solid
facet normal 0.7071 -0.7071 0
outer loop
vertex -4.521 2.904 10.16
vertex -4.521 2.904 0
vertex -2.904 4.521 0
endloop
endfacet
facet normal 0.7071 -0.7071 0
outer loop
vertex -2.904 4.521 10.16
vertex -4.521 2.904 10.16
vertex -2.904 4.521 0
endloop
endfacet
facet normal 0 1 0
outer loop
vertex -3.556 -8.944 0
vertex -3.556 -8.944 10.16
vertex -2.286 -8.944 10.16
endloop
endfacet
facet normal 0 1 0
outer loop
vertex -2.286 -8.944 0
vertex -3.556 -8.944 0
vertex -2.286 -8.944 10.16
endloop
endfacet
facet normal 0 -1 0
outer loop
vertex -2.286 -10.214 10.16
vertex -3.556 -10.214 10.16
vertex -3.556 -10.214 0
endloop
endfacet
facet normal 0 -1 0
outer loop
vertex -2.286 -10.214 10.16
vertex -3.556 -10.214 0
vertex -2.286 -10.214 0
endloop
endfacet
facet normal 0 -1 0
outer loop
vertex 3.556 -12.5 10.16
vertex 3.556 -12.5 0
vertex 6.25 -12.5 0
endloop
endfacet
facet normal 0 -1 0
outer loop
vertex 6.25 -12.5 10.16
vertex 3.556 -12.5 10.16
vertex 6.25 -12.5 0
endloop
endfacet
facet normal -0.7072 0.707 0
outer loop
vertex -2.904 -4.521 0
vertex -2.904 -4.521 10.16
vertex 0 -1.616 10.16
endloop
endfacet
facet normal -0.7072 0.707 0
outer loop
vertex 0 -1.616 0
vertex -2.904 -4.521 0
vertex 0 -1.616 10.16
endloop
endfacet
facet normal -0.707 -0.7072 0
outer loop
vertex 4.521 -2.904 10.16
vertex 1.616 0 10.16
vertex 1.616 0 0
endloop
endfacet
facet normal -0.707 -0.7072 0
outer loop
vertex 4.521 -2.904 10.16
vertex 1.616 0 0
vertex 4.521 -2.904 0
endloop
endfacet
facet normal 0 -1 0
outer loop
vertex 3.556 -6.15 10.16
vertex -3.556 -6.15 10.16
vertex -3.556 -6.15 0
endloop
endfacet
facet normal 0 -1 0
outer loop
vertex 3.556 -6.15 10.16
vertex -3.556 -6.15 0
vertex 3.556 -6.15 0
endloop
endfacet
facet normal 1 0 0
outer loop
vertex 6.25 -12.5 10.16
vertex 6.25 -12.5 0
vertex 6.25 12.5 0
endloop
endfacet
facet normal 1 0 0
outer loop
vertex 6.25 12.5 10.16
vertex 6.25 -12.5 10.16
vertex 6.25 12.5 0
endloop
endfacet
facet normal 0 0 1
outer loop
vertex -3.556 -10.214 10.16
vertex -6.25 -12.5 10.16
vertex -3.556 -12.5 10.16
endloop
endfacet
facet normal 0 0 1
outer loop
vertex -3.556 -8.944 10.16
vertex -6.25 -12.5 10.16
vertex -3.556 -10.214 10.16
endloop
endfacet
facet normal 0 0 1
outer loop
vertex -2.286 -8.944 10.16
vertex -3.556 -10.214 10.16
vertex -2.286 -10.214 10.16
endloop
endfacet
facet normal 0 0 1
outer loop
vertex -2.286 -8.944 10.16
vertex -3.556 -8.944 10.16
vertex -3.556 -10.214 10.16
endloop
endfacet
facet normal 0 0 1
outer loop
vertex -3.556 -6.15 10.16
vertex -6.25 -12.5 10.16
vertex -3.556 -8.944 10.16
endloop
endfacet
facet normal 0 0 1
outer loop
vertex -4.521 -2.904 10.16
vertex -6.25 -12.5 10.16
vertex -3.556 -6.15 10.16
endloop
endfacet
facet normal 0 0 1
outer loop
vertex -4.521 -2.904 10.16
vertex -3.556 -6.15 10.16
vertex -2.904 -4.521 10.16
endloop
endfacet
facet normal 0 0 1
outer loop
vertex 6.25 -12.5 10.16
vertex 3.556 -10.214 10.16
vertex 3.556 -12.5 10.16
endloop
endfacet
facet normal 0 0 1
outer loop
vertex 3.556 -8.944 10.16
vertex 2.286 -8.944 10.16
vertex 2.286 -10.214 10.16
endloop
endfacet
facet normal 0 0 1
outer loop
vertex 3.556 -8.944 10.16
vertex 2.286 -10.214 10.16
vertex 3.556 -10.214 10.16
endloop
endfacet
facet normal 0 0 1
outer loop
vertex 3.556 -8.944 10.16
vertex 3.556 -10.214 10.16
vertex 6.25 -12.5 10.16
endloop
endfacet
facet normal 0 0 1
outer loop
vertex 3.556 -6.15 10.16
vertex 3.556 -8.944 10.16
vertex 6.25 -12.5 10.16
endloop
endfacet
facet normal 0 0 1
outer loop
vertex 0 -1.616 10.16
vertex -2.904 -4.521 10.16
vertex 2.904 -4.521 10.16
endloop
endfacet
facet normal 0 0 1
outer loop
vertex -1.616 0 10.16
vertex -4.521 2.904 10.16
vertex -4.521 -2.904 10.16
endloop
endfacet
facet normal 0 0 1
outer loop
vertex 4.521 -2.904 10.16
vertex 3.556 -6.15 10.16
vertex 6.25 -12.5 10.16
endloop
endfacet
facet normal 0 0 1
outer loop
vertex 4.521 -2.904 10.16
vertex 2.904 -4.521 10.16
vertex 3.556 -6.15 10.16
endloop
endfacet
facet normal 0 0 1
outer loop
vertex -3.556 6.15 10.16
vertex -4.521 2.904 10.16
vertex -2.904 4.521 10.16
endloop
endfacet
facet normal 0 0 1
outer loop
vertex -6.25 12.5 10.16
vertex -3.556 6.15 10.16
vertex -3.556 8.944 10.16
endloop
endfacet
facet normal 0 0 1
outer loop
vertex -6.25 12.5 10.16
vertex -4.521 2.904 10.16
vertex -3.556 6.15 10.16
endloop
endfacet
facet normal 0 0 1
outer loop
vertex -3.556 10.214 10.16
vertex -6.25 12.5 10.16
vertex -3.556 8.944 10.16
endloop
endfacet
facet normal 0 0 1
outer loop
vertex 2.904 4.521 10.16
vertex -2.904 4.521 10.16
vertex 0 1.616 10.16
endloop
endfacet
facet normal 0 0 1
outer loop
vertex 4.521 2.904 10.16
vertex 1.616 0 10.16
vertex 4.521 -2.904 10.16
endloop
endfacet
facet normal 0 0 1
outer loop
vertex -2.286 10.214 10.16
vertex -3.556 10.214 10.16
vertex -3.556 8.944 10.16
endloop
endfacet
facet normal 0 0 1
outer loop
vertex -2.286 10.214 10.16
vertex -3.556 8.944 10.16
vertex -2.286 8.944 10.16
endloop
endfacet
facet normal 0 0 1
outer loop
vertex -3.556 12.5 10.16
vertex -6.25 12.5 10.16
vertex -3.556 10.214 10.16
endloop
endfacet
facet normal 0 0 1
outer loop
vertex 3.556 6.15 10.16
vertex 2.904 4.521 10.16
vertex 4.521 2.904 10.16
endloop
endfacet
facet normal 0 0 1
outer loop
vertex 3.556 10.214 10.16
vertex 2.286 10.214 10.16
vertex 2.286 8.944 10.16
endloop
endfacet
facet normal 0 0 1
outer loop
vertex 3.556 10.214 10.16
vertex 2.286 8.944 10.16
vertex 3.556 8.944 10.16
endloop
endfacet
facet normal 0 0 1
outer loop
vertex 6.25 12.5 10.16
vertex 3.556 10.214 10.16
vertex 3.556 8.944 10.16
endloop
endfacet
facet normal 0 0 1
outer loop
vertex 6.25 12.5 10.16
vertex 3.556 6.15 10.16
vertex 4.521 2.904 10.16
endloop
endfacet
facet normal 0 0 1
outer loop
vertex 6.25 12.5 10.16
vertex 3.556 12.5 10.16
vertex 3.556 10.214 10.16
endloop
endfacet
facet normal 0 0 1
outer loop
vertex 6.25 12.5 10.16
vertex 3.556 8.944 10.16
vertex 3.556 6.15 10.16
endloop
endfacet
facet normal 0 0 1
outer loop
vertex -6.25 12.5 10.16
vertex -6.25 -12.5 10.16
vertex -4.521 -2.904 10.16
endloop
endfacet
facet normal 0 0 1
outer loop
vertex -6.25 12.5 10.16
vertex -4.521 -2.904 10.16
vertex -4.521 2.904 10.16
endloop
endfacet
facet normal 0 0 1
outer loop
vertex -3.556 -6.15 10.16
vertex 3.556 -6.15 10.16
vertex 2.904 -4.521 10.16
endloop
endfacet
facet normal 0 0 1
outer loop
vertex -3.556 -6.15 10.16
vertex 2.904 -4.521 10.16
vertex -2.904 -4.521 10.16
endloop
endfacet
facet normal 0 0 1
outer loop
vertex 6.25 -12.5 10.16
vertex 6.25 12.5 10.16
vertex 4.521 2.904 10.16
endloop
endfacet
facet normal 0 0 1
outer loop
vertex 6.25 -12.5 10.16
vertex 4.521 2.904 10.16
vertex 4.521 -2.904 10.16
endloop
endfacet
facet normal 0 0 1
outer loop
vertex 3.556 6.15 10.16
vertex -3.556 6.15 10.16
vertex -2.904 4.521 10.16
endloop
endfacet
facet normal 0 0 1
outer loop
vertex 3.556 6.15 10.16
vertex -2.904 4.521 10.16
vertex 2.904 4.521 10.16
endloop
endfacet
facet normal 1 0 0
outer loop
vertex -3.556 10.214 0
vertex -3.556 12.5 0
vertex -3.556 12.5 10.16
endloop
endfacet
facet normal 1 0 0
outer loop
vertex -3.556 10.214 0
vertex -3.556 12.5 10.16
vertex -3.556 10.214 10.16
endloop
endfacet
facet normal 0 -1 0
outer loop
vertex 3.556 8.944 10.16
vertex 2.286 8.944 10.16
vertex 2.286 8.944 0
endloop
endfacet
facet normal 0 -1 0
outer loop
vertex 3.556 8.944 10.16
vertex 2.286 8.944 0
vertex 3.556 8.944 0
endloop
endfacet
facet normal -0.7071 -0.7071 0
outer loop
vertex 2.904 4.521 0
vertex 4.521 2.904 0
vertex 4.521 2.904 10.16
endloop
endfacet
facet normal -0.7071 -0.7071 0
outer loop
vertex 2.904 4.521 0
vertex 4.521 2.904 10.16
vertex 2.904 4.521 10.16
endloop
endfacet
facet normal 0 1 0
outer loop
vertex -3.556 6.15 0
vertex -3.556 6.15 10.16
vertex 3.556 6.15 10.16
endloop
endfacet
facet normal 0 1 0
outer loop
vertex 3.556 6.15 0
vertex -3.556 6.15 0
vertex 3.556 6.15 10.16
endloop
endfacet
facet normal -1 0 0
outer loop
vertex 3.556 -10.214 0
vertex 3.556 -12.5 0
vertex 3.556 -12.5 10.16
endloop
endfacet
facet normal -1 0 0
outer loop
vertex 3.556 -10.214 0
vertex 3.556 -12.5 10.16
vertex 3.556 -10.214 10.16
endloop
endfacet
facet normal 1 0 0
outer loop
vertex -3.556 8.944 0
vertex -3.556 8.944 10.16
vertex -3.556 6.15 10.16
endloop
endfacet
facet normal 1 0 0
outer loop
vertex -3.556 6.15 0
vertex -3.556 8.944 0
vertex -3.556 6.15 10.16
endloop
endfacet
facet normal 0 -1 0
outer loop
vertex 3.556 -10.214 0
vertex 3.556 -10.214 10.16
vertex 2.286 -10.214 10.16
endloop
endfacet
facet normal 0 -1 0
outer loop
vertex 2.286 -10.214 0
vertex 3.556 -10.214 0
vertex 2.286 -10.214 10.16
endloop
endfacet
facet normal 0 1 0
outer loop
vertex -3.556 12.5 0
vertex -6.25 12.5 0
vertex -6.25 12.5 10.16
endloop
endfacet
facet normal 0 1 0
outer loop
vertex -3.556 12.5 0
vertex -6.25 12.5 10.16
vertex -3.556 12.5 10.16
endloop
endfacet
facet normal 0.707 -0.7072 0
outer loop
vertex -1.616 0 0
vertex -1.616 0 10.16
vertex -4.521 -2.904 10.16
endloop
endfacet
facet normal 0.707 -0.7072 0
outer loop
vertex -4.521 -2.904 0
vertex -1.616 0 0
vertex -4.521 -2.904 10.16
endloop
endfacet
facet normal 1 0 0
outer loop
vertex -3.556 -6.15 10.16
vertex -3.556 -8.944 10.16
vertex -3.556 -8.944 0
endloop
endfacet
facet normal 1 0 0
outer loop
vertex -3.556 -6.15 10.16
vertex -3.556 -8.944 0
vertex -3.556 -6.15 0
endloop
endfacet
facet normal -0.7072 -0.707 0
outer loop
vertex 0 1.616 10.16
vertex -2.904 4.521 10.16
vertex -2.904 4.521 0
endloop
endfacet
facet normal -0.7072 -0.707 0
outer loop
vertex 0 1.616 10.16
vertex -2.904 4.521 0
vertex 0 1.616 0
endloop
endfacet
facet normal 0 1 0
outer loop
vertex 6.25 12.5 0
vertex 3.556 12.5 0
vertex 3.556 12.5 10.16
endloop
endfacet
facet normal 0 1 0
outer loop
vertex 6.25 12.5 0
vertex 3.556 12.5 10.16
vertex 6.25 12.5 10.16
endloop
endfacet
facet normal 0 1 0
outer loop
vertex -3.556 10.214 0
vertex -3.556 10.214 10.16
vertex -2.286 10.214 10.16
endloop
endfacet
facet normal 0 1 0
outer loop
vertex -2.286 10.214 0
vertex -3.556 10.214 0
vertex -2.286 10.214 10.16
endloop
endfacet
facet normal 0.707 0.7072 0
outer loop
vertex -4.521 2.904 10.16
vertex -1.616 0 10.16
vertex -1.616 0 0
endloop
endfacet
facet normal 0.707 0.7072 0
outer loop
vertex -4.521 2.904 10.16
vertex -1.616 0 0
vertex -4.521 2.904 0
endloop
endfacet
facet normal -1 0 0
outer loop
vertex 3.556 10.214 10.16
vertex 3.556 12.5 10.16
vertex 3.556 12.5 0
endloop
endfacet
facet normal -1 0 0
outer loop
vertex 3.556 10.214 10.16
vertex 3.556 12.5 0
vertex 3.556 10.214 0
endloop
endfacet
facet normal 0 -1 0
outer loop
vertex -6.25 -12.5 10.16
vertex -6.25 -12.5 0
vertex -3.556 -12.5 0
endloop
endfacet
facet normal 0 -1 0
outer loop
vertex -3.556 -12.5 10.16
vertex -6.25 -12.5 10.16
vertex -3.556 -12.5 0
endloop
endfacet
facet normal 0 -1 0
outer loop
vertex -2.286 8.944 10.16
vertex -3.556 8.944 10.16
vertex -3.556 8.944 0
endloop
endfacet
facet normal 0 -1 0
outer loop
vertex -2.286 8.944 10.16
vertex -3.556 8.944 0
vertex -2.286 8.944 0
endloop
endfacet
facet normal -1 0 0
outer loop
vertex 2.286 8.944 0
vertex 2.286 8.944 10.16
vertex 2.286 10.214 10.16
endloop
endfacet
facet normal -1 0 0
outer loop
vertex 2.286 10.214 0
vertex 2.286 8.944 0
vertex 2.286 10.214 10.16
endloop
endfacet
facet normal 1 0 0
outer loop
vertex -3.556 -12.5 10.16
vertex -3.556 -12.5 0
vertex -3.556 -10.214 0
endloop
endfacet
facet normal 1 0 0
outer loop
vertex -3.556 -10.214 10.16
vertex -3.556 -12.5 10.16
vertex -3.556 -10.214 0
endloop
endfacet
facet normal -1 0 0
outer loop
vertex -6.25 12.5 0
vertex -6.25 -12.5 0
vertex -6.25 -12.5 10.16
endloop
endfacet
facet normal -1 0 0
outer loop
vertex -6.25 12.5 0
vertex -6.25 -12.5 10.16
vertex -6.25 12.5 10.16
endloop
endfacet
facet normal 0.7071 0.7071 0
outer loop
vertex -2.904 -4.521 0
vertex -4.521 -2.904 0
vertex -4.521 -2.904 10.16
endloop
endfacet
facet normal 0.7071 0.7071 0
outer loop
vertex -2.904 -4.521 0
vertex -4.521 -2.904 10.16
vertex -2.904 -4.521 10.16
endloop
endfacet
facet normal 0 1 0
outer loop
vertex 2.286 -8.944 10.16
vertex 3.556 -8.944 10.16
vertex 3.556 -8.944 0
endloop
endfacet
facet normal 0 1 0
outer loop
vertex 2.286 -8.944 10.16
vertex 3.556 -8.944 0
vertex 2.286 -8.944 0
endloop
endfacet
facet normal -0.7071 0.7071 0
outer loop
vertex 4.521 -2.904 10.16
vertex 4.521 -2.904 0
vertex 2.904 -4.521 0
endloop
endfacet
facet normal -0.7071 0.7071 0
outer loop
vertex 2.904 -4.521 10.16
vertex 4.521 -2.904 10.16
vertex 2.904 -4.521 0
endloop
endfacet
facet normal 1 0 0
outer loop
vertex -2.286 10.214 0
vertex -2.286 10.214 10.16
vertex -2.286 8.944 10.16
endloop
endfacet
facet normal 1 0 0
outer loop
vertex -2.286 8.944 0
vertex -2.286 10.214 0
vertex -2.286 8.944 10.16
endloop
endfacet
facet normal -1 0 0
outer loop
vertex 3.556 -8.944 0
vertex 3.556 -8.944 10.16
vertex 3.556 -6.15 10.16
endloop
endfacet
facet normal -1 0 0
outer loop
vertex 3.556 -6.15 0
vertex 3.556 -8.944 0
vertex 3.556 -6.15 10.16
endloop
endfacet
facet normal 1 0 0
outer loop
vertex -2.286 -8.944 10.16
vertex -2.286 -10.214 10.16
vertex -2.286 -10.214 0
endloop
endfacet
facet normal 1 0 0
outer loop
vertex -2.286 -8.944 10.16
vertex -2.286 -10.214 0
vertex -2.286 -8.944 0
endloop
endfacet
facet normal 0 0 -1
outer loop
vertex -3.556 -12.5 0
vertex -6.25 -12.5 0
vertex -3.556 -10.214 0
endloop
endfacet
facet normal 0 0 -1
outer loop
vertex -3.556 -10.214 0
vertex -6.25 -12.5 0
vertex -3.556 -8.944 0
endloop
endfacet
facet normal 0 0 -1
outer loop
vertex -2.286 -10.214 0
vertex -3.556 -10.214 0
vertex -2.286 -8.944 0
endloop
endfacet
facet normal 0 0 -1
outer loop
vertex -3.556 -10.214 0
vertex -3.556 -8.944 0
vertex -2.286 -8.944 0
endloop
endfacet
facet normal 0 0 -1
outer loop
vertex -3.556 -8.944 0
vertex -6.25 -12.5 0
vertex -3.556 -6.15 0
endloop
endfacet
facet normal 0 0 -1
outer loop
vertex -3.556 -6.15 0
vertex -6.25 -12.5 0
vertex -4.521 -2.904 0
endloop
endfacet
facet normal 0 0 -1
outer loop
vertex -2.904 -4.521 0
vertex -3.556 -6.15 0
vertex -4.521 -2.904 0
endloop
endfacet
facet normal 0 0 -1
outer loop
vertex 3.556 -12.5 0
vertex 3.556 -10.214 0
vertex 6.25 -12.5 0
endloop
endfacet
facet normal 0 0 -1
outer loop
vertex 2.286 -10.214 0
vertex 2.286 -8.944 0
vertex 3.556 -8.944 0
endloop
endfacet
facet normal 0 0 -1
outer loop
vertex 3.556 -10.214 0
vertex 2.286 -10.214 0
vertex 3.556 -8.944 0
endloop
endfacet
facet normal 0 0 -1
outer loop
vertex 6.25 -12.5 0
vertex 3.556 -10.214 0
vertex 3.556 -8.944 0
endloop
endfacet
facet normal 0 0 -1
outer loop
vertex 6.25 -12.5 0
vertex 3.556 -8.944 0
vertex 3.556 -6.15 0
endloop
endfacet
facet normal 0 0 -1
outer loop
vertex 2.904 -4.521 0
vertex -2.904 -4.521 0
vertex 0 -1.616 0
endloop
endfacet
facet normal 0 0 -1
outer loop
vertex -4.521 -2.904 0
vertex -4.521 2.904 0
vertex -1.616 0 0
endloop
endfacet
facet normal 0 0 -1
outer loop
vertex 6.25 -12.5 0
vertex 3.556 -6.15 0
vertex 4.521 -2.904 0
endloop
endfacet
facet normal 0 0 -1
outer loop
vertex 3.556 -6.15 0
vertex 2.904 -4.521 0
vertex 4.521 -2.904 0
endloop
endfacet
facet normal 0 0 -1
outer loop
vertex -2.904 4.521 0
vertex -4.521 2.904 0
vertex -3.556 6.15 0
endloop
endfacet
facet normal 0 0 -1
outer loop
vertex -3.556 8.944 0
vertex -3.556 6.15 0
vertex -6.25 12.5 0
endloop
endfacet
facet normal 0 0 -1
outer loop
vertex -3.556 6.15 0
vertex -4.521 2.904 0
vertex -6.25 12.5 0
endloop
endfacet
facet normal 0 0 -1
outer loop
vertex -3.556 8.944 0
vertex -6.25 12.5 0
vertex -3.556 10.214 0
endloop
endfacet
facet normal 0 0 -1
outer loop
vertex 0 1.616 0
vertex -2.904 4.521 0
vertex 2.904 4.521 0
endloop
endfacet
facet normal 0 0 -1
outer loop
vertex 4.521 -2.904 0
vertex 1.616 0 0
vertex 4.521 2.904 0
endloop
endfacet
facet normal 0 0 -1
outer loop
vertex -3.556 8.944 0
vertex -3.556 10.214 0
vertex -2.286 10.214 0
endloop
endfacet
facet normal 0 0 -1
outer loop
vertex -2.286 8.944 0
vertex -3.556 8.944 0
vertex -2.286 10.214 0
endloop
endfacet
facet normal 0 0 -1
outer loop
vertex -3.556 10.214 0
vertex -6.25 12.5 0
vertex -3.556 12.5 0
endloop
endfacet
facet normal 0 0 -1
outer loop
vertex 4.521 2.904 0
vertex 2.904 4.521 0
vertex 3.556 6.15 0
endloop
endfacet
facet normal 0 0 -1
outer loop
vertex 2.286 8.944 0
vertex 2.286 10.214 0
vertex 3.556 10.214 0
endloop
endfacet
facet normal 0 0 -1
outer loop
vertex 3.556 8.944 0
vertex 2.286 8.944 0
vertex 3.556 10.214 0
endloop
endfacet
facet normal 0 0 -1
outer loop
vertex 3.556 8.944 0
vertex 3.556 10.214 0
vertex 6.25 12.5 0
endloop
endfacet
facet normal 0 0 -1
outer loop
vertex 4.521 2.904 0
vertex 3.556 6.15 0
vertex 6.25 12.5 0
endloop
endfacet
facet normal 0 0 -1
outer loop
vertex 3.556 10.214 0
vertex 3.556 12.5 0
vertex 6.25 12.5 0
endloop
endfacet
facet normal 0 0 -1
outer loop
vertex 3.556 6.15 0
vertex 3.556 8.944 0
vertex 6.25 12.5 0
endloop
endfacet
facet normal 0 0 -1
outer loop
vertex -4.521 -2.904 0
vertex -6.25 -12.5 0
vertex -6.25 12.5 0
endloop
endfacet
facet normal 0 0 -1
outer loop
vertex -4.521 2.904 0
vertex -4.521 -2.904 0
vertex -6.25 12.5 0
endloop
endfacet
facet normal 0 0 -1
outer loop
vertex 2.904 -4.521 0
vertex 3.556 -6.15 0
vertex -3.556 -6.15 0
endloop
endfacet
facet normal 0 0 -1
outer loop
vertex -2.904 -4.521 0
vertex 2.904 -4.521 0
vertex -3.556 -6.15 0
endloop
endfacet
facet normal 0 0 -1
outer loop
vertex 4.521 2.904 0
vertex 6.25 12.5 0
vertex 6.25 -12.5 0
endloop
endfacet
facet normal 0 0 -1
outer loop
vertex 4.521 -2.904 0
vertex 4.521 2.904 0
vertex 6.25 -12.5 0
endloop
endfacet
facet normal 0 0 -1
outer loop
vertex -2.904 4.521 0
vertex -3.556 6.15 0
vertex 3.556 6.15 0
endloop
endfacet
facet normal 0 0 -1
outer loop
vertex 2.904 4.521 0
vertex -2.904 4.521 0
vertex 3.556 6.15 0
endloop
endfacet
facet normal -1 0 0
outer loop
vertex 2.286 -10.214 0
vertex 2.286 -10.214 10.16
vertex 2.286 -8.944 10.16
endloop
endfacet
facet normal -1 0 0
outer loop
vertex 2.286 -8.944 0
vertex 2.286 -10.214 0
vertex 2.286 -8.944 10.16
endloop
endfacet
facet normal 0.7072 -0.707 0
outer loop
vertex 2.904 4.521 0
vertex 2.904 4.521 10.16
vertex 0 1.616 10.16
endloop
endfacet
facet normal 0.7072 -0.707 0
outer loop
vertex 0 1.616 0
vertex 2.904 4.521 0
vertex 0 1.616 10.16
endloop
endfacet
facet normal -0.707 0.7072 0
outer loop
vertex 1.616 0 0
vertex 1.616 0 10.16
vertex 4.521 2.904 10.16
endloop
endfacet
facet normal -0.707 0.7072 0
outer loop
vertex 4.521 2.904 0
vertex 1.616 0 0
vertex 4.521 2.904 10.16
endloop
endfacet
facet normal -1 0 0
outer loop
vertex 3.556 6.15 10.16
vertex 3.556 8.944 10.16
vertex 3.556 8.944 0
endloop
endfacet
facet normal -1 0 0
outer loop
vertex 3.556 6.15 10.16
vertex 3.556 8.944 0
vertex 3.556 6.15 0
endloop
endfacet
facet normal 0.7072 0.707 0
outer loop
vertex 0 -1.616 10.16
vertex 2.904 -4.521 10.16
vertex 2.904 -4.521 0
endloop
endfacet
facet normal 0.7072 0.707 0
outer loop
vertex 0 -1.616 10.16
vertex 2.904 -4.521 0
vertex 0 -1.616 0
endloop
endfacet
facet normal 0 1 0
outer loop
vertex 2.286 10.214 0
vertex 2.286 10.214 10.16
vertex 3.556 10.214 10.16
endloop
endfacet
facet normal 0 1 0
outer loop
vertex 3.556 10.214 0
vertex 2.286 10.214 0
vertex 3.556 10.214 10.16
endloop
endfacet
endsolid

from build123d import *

# Parameters (mm, degrees)
F0_W             = 12.5
F0_H             = 25
F1_DEPTH         = 10.16
F2_W             = 7.112
F2_H             = 6.35
F3_DEPTH         = 25.4
F4_W             = 1.27
F4_H             = 1.27
F5_DEPTH         = 10.16
F5_COPIES2_COUNT = 2
F5_COPIES2_PITCH = 20.028927
F8_DEPTH         = 25.4


# Not quite as in the source:
# - a pattern or mirror of a feature is missing from the dataset's text; its kind, count and spacing are read off the source's solid


with BuildPart() as f1:
    # F0 (on Top) → F1 (new body)
    with BuildSketch(Plane.XY):
        Rectangle(F0_W, F0_H)
    extrude(amount=F1_DEPTH)

    # F2 (on face) → F3 (cut)
    with BuildSketch(Plane.XY.offset(10.16)):
        with Locations((0, -9.325)):
            Rectangle(F2_W, F2_H)
    f3 = extrude(amount=-F3_DEPTH, mode=Mode.SUBTRACT)

    # F3_copies: F3 across plane
    add(f3.mirror(Plane.ZX), mode=Mode.SUBTRACT)

    # F4 (on face) → F5 (join, through all)
    with BuildSketch(Plane.XY.offset(10.16)):
        with Locations((-2.921, -9.579)):
            Rectangle(F4_W, F4_H)
    f5 = extrude(amount=-F5_DEPTH)

    # F5_copies: F5 across plane
    add(f5.mirror(Plane(origin=(0, 0, 0), x_dir=(0, 0, 1), z_dir=(1, 0, 0))))

    # F5_copies1: F5 across plane
    add(f5.mirror(Plane.ZX))

    # F5_copies2: F5 ×2
    with Locations(*[Vector(0.2916781273, 0.9565165289, 0) * (i * F5_COPIES2_PITCH) for i in range(1, F5_COPIES2_COUNT)]):
        add(f5)

    # F7 (on face) → F8 (cut)
    with BuildSketch(Plane.XY.offset(10.16)):
        Polygon((-0.8082230509, 0.8082230509), (-4.5205336521, -2.9040875503), (-3.7123106012, -3.7123106012), (0, 0), align=None)
        Polygon((2.9040875503, 4.5205336521), (-0.8082230509, 0.8082230509), (0, 0), (-3.7123106012, -3.7123106012), (-2.9040875503, -4.5205336521), (4.5205336521, 2.9040875503), align=None)
    f8 = extrude(amount=-F8_DEPTH, mode=Mode.SUBTRACT)

    # F8_copies: F8 across plane
    add(f8.mirror(Plane(origin=(0, 0, 0), x_dir=(0, 0, 1), z_dir=(1, 0, 0))), mode=Mode.SUBTRACT)


solid = f1.part
